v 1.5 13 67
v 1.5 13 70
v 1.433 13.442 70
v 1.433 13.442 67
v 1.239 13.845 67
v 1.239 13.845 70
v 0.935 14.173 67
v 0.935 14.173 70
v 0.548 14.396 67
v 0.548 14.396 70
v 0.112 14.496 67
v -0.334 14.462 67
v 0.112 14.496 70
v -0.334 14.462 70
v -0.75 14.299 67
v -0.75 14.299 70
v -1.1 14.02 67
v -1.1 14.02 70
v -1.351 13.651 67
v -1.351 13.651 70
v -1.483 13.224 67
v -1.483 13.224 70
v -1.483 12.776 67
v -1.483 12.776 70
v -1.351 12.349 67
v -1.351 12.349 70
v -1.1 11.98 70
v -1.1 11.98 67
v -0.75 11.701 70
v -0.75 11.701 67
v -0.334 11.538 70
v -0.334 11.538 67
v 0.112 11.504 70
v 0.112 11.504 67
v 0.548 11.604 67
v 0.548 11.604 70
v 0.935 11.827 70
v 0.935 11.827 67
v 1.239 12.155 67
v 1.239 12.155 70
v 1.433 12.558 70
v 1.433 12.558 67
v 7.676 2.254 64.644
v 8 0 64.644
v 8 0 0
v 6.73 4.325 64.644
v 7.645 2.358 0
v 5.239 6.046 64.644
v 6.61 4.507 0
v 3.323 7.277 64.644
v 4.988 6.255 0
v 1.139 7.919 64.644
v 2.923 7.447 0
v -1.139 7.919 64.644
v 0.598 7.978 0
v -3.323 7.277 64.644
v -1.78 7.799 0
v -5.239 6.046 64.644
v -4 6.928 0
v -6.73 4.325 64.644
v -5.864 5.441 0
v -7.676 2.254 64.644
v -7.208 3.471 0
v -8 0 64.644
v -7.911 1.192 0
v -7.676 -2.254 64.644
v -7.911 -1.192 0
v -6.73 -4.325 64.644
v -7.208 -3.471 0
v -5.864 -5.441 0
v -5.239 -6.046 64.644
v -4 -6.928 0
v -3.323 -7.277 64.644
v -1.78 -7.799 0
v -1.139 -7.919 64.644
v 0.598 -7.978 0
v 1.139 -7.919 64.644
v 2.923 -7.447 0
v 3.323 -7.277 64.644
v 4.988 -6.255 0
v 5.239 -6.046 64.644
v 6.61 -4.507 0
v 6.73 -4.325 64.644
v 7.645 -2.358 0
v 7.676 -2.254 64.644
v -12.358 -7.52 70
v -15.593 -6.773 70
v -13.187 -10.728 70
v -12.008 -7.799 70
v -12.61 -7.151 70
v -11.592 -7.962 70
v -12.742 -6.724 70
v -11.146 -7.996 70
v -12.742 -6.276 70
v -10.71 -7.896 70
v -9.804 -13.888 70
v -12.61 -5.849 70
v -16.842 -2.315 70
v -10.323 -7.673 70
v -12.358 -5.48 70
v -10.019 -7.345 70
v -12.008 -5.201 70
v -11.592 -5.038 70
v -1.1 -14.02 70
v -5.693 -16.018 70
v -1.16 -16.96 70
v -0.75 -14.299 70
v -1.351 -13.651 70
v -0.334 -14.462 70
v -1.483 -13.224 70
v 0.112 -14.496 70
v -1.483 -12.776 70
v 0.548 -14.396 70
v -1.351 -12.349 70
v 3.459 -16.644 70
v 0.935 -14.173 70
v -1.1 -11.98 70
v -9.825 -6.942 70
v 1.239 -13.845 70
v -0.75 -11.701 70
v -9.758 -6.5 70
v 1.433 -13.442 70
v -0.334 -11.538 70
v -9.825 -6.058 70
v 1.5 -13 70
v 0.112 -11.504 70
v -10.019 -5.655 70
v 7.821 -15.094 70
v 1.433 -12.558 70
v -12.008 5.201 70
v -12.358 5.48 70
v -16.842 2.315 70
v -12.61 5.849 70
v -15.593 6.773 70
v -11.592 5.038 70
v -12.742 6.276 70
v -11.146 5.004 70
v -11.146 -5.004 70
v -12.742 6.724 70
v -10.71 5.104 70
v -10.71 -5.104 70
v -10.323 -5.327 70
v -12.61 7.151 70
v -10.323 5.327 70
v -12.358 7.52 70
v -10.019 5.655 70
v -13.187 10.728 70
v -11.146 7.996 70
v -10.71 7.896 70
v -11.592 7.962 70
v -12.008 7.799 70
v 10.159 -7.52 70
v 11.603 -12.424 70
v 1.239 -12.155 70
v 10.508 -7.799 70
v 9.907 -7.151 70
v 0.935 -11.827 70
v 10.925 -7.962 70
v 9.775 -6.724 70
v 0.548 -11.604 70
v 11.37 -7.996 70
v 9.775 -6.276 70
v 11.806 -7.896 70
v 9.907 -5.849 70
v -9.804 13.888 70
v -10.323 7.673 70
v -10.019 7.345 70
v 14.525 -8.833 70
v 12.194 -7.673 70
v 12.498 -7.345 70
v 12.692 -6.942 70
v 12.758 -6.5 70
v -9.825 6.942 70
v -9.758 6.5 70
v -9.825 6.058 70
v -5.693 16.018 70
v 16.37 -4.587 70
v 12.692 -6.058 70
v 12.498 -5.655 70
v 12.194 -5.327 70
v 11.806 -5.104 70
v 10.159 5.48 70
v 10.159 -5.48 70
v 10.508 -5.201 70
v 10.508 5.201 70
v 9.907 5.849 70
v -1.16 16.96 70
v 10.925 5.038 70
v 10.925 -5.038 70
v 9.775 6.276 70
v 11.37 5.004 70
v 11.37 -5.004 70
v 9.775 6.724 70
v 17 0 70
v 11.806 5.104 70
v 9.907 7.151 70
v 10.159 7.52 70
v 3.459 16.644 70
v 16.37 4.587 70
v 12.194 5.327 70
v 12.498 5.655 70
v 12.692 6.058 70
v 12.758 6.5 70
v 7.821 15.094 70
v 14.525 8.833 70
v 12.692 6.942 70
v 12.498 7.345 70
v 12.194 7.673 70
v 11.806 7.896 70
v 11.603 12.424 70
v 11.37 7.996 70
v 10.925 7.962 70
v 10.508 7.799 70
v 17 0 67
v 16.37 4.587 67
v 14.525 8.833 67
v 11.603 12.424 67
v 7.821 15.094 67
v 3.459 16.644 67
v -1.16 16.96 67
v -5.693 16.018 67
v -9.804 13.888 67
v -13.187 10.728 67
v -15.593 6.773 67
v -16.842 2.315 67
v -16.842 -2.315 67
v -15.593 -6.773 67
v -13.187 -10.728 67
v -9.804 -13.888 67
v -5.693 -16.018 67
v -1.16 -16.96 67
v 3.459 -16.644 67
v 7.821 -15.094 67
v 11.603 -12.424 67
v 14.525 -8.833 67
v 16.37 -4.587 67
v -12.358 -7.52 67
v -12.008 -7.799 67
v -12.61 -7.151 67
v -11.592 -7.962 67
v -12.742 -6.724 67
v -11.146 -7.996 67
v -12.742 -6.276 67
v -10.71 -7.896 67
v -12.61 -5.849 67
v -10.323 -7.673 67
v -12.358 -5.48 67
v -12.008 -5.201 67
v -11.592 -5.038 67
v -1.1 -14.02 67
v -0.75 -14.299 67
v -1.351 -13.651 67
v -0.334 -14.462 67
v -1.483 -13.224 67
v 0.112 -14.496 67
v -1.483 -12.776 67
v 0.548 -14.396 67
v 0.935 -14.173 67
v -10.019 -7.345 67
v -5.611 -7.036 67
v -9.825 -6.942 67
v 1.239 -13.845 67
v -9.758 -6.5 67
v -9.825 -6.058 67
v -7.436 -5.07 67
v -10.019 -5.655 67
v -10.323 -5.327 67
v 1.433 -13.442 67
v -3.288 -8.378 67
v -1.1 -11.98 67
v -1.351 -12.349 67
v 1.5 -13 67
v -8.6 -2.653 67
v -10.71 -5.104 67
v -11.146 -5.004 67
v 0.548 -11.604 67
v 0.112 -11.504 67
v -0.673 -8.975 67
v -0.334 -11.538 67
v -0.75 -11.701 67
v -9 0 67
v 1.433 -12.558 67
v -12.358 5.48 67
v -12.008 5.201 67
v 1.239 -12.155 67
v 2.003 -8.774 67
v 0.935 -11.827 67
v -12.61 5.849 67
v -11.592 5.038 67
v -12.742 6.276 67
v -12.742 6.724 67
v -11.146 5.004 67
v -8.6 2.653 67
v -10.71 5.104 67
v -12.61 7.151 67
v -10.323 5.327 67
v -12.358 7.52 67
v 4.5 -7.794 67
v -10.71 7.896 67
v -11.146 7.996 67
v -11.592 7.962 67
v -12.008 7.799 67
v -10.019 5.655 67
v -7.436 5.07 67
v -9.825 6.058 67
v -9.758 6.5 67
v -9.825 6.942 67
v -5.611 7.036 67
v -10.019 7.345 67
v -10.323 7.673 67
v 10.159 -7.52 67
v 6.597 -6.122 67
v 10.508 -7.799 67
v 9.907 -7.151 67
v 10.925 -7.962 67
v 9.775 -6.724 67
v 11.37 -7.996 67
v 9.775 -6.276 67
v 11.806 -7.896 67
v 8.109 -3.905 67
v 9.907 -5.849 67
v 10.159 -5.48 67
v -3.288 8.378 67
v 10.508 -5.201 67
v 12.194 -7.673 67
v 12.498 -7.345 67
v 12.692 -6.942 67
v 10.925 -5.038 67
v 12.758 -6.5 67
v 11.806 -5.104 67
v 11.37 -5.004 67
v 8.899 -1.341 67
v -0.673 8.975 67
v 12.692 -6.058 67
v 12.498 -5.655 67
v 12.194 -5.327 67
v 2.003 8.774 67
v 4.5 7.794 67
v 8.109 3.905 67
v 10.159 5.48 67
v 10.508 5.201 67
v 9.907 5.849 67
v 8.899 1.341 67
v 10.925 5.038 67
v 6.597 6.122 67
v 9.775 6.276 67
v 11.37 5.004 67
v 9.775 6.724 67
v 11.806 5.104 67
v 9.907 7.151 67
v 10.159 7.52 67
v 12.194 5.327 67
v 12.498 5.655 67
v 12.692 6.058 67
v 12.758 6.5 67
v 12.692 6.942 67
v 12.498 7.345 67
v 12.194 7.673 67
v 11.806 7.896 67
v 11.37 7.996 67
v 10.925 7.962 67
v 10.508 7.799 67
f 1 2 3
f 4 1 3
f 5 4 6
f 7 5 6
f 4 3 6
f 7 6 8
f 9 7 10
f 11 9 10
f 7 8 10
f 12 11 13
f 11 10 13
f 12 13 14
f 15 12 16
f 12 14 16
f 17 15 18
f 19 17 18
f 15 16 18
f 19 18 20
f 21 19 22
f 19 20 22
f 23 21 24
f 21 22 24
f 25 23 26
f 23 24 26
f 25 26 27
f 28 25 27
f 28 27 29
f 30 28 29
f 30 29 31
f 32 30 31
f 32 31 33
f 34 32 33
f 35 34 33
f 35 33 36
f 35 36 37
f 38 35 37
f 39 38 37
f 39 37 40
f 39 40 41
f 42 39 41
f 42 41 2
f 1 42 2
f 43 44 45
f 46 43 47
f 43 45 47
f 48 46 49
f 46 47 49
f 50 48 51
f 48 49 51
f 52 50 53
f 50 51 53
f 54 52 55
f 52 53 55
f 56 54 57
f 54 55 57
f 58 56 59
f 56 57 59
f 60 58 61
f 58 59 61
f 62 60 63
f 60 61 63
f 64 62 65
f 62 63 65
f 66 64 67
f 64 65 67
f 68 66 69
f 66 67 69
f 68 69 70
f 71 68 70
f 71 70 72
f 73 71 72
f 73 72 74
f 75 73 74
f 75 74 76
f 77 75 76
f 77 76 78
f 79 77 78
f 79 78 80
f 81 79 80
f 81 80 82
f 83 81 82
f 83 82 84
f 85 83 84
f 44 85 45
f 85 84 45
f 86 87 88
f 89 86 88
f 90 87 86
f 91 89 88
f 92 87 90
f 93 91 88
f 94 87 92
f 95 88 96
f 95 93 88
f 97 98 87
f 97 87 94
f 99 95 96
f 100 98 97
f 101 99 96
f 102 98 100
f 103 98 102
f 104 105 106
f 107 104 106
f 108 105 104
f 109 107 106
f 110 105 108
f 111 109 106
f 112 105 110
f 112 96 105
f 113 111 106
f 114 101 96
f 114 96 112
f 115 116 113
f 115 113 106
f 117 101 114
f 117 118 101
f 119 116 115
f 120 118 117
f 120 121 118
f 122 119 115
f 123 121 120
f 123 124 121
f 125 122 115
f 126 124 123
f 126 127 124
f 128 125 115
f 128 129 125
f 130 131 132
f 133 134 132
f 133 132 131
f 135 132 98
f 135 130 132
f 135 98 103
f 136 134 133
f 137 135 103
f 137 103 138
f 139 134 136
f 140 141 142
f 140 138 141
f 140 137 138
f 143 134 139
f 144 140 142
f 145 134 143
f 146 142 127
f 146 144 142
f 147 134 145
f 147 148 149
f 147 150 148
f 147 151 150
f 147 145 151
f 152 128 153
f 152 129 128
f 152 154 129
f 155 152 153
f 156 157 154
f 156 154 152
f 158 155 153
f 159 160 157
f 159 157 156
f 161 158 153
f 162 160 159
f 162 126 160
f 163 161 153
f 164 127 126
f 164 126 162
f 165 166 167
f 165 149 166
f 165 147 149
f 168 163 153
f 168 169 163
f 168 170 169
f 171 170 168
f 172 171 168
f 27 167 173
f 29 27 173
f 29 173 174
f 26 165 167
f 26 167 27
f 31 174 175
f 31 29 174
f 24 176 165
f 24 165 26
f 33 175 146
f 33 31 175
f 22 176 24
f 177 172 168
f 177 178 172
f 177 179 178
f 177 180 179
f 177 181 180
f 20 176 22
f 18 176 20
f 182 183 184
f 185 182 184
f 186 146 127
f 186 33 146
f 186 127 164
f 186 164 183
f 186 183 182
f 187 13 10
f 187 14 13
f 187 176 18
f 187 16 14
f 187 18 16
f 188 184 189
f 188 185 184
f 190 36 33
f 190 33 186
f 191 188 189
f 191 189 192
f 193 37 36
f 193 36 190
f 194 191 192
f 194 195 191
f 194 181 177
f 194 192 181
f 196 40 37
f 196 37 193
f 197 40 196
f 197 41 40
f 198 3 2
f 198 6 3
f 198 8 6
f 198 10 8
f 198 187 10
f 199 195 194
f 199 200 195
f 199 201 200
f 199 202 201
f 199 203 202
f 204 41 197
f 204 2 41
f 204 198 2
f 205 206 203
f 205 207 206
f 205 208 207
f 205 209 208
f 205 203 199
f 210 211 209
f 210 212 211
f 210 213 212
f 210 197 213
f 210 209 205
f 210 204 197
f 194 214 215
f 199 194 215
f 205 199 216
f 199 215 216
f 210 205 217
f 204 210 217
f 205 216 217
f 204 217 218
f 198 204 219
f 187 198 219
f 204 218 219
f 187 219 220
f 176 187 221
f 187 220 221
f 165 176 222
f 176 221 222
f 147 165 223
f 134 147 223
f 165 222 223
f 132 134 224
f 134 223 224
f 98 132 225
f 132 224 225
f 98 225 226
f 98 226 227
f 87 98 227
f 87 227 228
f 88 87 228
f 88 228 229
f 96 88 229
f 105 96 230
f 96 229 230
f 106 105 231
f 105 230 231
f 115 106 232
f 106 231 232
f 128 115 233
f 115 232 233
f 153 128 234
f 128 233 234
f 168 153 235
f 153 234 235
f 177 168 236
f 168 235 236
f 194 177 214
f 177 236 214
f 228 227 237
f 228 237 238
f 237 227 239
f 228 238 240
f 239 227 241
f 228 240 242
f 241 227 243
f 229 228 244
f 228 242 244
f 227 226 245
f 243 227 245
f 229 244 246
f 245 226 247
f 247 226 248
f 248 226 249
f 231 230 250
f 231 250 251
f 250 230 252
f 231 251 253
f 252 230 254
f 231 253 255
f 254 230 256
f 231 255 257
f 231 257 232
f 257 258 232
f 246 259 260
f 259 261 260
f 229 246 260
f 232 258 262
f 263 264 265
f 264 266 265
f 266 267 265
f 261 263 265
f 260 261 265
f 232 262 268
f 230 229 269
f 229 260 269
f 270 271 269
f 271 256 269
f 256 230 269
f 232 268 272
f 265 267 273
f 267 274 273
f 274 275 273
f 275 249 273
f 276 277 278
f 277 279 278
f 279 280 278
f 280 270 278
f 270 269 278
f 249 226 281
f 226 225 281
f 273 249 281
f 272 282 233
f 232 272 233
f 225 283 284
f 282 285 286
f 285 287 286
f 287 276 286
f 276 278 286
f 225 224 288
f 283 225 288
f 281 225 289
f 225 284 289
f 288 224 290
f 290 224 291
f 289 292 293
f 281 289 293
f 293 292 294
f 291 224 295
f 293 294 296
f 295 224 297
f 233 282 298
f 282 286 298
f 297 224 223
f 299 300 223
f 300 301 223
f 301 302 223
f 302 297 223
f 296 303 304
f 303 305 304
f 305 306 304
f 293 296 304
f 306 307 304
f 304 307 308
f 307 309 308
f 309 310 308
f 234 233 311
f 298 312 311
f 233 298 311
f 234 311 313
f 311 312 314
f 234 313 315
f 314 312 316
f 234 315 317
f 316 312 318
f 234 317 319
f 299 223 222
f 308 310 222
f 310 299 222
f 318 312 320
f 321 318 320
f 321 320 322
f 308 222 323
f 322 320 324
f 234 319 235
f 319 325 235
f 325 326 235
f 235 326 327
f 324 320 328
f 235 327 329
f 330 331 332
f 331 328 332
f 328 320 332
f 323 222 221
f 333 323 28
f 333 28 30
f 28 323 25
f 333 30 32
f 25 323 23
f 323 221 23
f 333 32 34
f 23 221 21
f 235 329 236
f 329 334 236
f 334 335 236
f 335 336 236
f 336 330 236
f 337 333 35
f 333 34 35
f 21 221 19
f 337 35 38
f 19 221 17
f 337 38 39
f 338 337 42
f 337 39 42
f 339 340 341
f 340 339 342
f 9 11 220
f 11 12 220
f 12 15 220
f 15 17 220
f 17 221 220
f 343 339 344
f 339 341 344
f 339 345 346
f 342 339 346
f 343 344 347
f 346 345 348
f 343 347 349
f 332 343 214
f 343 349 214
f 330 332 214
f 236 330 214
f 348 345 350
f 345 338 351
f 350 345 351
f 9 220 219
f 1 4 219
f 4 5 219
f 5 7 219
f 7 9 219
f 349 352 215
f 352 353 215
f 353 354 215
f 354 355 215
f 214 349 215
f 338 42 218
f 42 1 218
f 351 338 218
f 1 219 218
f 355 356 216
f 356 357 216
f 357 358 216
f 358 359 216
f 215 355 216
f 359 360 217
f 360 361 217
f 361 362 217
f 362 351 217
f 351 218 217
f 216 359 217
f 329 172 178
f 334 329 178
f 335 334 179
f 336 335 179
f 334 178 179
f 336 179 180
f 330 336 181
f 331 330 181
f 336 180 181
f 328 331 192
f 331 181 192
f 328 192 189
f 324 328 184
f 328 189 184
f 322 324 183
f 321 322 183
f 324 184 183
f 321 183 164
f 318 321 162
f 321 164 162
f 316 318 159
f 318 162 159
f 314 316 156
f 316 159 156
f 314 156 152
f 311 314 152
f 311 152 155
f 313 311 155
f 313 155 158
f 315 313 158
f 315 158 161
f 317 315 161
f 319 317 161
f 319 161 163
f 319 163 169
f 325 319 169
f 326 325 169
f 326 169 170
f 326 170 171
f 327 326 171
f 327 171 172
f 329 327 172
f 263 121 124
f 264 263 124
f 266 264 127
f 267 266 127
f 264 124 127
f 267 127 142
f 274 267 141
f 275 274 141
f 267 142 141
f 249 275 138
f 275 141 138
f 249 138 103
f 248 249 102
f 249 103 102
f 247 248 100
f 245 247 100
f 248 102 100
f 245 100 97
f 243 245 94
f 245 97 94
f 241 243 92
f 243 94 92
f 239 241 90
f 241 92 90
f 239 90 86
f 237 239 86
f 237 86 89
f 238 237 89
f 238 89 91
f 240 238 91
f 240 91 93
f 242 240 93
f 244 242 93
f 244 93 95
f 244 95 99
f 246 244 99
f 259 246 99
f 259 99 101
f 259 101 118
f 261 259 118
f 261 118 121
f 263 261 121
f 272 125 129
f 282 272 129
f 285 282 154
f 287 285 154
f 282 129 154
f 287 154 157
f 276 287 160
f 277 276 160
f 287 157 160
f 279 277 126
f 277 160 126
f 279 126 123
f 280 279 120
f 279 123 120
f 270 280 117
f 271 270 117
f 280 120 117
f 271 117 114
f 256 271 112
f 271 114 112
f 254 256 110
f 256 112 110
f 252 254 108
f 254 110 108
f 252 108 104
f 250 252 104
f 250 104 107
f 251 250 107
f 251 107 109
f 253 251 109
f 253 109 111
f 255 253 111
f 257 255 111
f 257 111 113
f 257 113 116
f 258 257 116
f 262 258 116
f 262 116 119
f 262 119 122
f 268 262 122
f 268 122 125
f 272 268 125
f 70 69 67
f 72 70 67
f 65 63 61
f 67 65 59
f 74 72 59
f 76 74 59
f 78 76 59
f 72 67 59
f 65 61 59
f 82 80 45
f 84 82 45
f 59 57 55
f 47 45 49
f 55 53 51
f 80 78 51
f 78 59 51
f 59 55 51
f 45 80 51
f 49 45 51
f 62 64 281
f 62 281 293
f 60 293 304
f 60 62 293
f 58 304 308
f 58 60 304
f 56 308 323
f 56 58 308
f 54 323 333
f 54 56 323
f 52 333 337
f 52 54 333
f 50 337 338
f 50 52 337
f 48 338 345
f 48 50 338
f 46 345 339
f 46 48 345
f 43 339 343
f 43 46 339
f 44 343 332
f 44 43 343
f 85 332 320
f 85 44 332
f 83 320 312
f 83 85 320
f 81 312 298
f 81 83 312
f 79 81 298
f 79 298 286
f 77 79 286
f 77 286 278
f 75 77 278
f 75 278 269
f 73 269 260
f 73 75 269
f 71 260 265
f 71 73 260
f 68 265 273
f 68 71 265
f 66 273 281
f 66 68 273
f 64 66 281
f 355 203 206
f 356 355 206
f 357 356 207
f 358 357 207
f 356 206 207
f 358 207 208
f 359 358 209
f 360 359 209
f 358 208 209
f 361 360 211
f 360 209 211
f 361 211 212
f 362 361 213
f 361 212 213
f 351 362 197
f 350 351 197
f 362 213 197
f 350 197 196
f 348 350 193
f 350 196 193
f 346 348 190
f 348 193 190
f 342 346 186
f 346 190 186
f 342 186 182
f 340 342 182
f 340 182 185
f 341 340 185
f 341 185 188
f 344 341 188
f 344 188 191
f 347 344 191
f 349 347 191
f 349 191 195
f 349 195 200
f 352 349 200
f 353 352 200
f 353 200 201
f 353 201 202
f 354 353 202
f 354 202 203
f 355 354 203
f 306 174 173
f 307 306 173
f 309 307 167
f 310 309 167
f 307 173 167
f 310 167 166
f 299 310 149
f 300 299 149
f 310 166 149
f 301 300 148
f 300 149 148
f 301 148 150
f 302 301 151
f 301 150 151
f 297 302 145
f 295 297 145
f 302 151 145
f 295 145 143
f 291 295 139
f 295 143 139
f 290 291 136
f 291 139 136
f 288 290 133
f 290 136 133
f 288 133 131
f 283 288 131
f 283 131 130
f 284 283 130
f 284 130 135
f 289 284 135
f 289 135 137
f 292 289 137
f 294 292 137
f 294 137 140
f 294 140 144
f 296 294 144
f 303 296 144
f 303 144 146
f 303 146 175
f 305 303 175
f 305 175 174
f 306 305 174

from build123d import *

# Parameters (mm, degrees)
CROQUIS1_R              = 8
SALIENTE_EXTRUIR1_DEPTH = 67
CROQUIS2_R              = 17
SALIENTE_EXTRUIR2_DEPTH = 3
CROQUIS3_R              = 9
SALIENTE_EXTRUIR3_DEPTH = 5
SALIENTE_EXTRUIR3_TAPER = 23
CROQUIS4_R              = 1.5
CORTAR_EXTRUIR2_DEPTH   = 5


with BuildPart() as part:
    # Croquis1 → Saliente-Extruir1 (new body)
    with BuildSketch(Plane.XY):
        Circle(CROQUIS1_R)
    extrude(amount=SALIENTE_EXTRUIR1_DEPTH)

    # Croquis2 → Saliente-Extruir2 (add)
    with BuildSketch(Plane.XY.offset(67)):
        Circle(CROQUIS2_R)
    extrude(amount=SALIENTE_EXTRUIR2_DEPTH)

    # Croquis3 → Saliente-Extruir3 (add)
    with BuildSketch(Plane(origin=(0, 0, 67), x_dir=(-1, 0, 0), z_dir=(0, 0, -1))):
        Circle(CROQUIS3_R)
    extrude(amount=SALIENTE_EXTRUIR3_DEPTH, taper=SALIENTE_EXTRUIR3_TAPER)

    # Croquis4 → Cortar-Extruir2 (cut)
    with BuildSketch(Plane.XY.offset(70)):
        with Locations((0, 13)):
            Circle(CROQUIS4_R)
        with Locations((11.258330249, 6.5)):
            Circle(CROQUIS4_R)
        with Locations((11.258330249, -6.5)):
            Circle(CROQUIS4_R)
        with Locations((0, -13)):
            Circle(CROQUIS4_R)
        with Locations((-11.258330249, -6.5)):
            Circle(CROQUIS4_R)
        with Locations((-11.258330249, 6.5)):
            Circle(CROQUIS4_R)
    extrude(amount=-CORTAR_EXTRUIR2_DEPTH, mode=Mode.SUBTRACT)


solid = part.part
